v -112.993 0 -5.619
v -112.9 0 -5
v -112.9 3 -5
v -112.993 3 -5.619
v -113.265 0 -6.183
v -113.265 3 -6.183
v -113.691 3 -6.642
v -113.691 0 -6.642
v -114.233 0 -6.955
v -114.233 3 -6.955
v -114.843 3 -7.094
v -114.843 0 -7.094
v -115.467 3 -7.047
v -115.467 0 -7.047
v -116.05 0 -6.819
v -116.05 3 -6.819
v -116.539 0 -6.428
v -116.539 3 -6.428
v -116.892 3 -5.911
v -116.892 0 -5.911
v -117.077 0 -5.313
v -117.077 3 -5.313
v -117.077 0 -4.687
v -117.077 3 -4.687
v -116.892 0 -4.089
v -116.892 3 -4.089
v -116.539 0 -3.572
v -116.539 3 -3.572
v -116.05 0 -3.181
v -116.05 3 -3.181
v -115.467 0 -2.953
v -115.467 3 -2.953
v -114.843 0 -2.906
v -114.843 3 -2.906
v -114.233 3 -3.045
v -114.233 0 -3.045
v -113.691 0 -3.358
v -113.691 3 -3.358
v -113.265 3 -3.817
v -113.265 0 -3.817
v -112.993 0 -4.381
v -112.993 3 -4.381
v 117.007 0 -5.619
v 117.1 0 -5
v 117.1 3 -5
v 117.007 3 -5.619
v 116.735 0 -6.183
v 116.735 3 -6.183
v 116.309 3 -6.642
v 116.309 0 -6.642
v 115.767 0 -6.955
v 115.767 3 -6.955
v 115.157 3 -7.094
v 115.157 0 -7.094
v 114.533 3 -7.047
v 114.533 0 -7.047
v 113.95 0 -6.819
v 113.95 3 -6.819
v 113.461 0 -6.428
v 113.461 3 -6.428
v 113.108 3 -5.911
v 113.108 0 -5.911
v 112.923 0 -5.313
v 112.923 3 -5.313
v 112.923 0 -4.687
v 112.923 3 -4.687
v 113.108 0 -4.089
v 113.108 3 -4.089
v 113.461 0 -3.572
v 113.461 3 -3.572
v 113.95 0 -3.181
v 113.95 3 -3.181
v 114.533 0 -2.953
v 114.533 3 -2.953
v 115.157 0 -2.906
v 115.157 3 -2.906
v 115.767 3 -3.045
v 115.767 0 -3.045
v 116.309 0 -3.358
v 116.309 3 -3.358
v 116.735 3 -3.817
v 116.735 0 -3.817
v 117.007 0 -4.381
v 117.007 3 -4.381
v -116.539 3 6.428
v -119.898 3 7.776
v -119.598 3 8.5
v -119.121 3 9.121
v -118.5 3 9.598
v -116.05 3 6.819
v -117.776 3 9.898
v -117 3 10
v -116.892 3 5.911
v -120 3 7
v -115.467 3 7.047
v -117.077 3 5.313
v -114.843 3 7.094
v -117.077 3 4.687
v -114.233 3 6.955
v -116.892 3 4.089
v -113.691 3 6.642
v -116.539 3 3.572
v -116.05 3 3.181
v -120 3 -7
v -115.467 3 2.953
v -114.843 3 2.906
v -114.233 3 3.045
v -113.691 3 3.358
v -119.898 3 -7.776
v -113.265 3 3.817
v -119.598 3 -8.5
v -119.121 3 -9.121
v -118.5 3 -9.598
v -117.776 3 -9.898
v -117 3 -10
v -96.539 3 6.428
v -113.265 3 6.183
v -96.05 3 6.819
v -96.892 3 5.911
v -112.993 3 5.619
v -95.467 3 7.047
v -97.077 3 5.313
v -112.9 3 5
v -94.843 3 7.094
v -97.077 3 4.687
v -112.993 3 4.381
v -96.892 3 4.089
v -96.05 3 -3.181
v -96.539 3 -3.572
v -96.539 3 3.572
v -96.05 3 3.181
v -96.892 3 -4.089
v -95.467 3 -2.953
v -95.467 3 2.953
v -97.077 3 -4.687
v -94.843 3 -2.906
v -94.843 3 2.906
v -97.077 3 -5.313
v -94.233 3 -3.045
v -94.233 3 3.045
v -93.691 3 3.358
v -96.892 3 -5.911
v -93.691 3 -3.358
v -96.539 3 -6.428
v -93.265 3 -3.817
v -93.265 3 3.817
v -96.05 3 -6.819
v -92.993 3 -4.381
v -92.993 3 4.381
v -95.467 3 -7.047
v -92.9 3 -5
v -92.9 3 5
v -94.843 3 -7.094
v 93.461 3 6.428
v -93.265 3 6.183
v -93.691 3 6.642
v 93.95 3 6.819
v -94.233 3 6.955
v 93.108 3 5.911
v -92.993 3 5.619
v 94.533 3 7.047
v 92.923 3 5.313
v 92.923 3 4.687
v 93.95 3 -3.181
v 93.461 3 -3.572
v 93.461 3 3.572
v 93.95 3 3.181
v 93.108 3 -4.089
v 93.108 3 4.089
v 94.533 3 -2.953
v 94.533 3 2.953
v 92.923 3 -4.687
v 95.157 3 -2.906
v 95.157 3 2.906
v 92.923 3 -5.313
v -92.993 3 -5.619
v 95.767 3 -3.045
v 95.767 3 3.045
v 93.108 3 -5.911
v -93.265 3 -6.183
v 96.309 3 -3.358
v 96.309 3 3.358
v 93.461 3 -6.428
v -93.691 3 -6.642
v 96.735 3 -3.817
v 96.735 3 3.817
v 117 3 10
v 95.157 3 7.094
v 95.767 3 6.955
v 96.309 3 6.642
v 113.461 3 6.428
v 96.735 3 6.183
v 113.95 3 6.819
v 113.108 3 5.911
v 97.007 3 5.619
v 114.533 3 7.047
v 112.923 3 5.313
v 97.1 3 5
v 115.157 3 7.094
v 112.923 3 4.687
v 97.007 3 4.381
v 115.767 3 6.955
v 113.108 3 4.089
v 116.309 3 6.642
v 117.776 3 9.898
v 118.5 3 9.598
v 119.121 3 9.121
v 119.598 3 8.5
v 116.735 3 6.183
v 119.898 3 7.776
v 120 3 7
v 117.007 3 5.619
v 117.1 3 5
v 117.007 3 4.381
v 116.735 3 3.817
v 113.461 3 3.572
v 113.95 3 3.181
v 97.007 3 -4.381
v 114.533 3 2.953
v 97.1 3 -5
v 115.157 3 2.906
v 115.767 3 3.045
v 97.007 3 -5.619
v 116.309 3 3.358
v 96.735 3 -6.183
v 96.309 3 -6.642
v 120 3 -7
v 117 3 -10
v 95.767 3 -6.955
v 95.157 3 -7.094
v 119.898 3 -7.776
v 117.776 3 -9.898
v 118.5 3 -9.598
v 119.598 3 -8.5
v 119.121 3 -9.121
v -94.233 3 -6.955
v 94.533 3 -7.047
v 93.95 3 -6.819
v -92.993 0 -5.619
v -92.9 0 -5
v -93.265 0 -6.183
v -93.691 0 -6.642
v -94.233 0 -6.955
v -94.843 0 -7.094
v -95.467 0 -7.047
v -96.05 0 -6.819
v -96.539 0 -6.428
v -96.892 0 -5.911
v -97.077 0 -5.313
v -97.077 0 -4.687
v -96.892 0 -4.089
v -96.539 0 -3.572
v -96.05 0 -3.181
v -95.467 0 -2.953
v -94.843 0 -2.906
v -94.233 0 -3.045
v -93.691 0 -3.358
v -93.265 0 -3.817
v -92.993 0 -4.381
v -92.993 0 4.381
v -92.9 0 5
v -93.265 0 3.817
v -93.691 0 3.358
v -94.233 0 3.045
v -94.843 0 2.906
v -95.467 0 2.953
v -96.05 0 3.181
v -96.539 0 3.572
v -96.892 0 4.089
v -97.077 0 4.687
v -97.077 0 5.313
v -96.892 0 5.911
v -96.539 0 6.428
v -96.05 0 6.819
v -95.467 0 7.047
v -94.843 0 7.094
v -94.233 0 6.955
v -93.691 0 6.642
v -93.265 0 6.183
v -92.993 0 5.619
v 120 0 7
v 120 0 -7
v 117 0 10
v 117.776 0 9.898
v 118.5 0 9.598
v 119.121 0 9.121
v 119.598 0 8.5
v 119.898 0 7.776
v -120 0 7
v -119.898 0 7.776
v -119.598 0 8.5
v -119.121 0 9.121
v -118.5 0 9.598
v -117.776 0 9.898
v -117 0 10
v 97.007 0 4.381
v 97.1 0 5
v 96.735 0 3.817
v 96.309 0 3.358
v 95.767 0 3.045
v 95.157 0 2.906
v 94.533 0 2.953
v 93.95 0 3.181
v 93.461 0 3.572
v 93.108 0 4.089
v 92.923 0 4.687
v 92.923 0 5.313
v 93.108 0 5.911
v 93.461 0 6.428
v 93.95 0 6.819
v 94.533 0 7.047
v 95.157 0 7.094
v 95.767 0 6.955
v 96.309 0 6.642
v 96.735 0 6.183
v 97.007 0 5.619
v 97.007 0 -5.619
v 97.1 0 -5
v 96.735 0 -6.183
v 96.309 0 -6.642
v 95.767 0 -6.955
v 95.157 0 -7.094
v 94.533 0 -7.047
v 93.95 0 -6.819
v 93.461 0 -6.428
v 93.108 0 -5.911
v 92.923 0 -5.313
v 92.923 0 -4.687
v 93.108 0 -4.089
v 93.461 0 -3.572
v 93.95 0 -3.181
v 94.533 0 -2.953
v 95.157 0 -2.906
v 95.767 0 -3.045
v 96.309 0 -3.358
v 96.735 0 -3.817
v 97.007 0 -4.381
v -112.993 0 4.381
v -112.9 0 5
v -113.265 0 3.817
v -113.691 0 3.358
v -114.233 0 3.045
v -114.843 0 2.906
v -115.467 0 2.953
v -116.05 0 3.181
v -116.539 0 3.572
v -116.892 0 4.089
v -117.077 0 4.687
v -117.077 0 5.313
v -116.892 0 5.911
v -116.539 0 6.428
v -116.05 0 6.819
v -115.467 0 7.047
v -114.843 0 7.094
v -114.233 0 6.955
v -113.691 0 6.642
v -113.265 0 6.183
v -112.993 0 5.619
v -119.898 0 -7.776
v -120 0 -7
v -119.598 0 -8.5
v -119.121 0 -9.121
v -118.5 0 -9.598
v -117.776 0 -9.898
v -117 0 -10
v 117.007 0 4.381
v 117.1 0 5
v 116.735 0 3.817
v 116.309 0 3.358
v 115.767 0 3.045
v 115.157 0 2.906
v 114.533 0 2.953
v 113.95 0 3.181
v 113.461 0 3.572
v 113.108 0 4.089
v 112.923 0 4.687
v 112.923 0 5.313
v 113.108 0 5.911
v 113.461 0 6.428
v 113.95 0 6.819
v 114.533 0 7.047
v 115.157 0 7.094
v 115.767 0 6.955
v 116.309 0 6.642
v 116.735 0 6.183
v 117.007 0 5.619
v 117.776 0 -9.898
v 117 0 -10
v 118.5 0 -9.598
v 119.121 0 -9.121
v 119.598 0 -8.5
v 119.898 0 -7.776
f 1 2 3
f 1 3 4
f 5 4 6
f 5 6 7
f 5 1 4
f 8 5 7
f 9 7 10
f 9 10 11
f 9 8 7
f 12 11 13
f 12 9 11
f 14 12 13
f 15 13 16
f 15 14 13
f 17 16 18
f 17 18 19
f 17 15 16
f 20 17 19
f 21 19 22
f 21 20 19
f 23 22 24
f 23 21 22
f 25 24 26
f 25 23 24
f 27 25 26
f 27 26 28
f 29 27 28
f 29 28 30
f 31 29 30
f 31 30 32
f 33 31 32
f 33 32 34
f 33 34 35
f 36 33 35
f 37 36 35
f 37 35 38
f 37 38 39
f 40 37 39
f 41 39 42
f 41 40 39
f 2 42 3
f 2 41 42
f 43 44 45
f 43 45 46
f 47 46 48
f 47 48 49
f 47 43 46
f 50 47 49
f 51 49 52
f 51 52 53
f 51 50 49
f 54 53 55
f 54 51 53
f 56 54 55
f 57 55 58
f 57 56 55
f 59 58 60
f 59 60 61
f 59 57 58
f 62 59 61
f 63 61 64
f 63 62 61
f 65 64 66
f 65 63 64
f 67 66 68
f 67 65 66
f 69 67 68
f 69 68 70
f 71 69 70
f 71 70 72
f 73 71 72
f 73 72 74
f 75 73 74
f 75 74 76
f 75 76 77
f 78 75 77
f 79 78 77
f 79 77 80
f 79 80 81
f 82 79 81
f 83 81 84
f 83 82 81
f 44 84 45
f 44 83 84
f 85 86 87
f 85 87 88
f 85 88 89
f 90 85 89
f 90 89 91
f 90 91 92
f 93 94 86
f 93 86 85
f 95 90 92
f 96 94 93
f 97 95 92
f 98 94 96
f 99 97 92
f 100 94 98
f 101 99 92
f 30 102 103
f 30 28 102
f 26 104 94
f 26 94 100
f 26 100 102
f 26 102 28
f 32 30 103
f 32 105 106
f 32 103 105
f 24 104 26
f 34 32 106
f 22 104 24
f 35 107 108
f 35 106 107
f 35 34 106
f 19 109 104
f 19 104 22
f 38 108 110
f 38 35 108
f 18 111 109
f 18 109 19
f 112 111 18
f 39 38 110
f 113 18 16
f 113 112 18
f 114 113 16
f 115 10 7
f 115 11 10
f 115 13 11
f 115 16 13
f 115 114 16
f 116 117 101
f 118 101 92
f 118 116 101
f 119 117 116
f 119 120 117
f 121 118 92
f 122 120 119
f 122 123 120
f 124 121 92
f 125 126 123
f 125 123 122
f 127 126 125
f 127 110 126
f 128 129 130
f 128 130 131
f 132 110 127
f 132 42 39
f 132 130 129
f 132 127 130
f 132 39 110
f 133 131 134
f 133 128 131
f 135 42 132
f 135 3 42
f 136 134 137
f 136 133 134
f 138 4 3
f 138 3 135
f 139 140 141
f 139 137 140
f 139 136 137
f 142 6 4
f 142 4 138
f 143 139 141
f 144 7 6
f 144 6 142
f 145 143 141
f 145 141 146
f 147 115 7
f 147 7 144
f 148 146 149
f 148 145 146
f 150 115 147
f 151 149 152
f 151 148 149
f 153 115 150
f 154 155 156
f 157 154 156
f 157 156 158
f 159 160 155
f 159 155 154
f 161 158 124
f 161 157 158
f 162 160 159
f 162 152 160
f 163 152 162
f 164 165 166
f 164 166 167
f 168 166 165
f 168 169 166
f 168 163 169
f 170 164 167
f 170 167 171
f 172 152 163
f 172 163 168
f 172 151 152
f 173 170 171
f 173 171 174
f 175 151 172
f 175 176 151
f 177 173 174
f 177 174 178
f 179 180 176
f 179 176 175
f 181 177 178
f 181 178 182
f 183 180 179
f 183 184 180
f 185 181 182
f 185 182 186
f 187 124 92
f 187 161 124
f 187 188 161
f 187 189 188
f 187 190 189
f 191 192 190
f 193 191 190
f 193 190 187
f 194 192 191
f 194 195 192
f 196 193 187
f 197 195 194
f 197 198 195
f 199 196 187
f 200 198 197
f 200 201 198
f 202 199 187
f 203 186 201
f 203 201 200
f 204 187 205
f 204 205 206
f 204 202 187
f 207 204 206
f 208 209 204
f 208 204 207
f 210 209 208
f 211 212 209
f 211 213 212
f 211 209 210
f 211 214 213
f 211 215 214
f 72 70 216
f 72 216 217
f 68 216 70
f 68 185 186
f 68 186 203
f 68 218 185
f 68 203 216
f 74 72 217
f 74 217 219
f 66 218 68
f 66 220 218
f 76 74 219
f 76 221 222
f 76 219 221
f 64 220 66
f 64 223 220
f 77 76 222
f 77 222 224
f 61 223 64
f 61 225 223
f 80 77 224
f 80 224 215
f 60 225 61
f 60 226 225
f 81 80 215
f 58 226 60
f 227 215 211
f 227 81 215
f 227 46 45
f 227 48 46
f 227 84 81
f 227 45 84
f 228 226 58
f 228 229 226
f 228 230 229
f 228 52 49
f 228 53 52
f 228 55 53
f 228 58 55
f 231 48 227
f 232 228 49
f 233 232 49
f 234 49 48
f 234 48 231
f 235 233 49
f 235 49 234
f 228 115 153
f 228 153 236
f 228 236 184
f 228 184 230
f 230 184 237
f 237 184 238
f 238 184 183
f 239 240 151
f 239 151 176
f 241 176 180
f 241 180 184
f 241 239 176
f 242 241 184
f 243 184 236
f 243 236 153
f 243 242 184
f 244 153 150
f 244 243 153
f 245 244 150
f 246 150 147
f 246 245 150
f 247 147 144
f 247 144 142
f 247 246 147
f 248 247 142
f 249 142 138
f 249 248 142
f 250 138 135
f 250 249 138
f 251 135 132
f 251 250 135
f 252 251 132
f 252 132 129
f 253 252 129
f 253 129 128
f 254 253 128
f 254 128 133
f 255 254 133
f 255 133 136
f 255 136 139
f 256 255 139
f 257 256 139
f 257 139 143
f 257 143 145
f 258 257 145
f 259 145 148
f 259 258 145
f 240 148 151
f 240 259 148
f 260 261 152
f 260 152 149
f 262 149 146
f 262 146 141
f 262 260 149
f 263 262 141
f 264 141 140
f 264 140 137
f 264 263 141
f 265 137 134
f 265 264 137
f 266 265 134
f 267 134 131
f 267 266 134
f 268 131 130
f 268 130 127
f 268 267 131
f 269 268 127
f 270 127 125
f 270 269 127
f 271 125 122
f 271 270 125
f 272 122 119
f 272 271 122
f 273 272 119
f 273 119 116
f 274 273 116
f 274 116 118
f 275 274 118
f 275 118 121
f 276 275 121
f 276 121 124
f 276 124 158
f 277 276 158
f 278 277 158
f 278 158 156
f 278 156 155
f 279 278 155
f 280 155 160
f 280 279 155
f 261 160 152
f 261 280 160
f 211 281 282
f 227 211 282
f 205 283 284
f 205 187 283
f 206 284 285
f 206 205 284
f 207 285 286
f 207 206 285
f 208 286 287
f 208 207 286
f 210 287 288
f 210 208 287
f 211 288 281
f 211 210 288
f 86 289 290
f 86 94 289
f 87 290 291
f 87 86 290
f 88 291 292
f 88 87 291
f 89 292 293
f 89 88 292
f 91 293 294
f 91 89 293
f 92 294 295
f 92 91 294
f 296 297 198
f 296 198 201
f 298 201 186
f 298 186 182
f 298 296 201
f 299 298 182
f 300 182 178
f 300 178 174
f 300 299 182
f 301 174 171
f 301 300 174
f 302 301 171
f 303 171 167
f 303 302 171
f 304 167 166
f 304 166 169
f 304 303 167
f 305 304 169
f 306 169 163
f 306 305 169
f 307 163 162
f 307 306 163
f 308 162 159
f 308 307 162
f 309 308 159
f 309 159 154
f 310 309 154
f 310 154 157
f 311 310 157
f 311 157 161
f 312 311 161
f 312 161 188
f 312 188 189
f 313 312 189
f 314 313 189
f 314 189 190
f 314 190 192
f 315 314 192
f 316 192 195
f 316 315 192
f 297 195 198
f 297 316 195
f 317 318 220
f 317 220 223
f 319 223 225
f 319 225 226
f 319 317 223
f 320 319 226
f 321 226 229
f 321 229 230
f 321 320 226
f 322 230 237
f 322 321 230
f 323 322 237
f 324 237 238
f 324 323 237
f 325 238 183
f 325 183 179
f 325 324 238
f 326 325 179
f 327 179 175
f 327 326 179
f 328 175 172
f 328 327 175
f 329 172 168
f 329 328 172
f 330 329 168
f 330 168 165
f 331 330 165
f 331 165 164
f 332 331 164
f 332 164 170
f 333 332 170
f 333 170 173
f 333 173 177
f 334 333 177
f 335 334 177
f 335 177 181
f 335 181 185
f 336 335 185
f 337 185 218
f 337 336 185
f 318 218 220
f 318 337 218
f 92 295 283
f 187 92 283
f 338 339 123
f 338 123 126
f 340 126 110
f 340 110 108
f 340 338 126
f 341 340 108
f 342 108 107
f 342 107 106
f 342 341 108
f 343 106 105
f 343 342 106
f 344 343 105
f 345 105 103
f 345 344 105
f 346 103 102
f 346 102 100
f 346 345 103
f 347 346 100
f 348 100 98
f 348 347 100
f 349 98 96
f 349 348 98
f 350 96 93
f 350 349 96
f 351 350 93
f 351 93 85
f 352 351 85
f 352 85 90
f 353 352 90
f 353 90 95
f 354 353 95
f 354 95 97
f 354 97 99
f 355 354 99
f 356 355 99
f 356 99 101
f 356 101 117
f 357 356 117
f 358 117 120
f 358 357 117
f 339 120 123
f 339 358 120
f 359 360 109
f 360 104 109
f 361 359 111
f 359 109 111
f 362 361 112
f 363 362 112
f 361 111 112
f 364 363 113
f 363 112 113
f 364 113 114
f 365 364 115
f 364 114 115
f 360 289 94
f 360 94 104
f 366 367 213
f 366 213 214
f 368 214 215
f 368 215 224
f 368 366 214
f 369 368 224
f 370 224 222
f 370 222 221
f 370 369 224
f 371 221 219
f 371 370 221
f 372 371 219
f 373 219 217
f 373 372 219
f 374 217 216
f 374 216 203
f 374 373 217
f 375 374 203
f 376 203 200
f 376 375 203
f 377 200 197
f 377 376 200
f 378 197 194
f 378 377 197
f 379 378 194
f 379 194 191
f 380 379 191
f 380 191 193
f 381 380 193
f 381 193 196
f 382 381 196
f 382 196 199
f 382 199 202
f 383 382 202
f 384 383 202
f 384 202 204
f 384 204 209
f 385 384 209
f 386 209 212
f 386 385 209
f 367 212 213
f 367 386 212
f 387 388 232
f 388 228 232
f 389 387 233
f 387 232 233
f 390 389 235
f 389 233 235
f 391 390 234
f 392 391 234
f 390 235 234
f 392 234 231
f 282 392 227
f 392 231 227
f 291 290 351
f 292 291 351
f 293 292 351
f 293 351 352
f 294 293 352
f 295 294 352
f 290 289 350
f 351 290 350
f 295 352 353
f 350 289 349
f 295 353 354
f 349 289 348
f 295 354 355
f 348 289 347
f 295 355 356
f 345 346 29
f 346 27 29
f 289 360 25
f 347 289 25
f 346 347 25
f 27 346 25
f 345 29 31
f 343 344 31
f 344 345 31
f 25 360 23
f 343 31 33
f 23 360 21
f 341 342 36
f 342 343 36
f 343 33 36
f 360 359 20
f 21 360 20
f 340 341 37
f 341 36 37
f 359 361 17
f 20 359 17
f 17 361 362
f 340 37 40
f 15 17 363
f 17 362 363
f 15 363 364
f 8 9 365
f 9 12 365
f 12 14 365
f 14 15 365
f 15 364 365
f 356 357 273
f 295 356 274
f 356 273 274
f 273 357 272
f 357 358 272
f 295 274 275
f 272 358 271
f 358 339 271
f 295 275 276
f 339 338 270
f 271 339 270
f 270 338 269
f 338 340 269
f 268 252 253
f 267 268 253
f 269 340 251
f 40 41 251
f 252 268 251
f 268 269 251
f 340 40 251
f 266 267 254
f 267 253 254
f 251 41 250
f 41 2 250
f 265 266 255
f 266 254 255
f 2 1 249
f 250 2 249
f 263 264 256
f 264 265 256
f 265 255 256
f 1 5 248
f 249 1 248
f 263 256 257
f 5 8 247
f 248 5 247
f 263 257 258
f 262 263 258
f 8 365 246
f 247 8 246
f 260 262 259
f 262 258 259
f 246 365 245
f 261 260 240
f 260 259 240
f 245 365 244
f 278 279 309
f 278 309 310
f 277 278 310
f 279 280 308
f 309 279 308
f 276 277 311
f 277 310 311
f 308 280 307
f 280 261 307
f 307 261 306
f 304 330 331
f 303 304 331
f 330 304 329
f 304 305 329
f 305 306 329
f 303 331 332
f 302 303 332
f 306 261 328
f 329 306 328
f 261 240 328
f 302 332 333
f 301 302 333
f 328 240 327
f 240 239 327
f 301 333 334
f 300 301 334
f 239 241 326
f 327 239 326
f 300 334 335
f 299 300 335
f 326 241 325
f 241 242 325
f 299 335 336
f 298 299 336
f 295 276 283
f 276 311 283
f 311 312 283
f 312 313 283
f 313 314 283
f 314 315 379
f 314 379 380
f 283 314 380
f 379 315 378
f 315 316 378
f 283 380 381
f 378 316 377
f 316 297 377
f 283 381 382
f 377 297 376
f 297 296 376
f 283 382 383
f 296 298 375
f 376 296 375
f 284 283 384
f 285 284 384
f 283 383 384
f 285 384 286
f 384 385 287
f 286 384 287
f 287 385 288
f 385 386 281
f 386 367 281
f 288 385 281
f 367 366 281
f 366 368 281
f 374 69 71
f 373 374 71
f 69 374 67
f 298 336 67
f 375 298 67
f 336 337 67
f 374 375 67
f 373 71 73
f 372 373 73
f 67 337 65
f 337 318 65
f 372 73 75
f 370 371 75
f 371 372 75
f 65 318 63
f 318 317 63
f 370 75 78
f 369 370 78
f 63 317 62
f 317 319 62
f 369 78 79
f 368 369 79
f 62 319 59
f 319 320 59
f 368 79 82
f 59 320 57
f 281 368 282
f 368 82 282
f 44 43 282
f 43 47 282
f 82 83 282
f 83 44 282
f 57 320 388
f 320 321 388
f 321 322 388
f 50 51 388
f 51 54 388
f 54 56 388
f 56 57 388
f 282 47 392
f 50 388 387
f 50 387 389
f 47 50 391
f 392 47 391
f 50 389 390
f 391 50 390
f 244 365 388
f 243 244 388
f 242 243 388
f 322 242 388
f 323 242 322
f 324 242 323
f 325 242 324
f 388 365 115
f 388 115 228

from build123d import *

# Parameters (mm, degrees)
SKETCH_2_W      = 240
SKETCH_2_H      = 20
SKETCH_2_R      = 2.1
EXTRUDE_1_DEPTH = 3
FILLET_1_R      = 3


with BuildPart() as part:
    # 草图2 → 凸台-拉伸1 (new body)
    with BuildSketch(Plane(origin=(0, 0, 0), x_dir=(1, 0, 0), z_dir=(0, 1, 0))):
        Rectangle(SKETCH_2_W, SKETCH_2_H)
        with Locations((-115, 5)):
            Circle(SKETCH_2_R, mode=Mode.SUBTRACT)
        with Locations((-95, 5)):
            Circle(SKETCH_2_R, mode=Mode.SUBTRACT)
        with Locations((-95, -5)):
            Circle(SKETCH_2_R, mode=Mode.SUBTRACT)
        with Locations((-115, -5)):
            Circle(SKETCH_2_R, mode=Mode.SUBTRACT)
        with Locations((115, -5)):
            Circle(SKETCH_2_R, mode=Mode.SUBTRACT)
        with Locations((95, -5)):
            Circle(SKETCH_2_R, mode=Mode.SUBTRACT)
        with Locations((95, 5)):
            Circle(SKETCH_2_R, mode=Mode.SUBTRACT)
        with Locations((115, 5)):
            Circle(SKETCH_2_R, mode=Mode.SUBTRACT)
    extrude(amount=EXTRUDE_1_DEPTH)

    # 圆角1
    fillet_1_edges = [part.edges().sort_by_distance(p)[0] for p in [
        (120, 1.5, 10),
        (-120, 1.5, 10),
        (-120, 1.5, -10),
        (120, 1.5, -10),
    ]]
    fillet(fillet_1_edges, radius=FILLET_1_R)


solid = part.part
